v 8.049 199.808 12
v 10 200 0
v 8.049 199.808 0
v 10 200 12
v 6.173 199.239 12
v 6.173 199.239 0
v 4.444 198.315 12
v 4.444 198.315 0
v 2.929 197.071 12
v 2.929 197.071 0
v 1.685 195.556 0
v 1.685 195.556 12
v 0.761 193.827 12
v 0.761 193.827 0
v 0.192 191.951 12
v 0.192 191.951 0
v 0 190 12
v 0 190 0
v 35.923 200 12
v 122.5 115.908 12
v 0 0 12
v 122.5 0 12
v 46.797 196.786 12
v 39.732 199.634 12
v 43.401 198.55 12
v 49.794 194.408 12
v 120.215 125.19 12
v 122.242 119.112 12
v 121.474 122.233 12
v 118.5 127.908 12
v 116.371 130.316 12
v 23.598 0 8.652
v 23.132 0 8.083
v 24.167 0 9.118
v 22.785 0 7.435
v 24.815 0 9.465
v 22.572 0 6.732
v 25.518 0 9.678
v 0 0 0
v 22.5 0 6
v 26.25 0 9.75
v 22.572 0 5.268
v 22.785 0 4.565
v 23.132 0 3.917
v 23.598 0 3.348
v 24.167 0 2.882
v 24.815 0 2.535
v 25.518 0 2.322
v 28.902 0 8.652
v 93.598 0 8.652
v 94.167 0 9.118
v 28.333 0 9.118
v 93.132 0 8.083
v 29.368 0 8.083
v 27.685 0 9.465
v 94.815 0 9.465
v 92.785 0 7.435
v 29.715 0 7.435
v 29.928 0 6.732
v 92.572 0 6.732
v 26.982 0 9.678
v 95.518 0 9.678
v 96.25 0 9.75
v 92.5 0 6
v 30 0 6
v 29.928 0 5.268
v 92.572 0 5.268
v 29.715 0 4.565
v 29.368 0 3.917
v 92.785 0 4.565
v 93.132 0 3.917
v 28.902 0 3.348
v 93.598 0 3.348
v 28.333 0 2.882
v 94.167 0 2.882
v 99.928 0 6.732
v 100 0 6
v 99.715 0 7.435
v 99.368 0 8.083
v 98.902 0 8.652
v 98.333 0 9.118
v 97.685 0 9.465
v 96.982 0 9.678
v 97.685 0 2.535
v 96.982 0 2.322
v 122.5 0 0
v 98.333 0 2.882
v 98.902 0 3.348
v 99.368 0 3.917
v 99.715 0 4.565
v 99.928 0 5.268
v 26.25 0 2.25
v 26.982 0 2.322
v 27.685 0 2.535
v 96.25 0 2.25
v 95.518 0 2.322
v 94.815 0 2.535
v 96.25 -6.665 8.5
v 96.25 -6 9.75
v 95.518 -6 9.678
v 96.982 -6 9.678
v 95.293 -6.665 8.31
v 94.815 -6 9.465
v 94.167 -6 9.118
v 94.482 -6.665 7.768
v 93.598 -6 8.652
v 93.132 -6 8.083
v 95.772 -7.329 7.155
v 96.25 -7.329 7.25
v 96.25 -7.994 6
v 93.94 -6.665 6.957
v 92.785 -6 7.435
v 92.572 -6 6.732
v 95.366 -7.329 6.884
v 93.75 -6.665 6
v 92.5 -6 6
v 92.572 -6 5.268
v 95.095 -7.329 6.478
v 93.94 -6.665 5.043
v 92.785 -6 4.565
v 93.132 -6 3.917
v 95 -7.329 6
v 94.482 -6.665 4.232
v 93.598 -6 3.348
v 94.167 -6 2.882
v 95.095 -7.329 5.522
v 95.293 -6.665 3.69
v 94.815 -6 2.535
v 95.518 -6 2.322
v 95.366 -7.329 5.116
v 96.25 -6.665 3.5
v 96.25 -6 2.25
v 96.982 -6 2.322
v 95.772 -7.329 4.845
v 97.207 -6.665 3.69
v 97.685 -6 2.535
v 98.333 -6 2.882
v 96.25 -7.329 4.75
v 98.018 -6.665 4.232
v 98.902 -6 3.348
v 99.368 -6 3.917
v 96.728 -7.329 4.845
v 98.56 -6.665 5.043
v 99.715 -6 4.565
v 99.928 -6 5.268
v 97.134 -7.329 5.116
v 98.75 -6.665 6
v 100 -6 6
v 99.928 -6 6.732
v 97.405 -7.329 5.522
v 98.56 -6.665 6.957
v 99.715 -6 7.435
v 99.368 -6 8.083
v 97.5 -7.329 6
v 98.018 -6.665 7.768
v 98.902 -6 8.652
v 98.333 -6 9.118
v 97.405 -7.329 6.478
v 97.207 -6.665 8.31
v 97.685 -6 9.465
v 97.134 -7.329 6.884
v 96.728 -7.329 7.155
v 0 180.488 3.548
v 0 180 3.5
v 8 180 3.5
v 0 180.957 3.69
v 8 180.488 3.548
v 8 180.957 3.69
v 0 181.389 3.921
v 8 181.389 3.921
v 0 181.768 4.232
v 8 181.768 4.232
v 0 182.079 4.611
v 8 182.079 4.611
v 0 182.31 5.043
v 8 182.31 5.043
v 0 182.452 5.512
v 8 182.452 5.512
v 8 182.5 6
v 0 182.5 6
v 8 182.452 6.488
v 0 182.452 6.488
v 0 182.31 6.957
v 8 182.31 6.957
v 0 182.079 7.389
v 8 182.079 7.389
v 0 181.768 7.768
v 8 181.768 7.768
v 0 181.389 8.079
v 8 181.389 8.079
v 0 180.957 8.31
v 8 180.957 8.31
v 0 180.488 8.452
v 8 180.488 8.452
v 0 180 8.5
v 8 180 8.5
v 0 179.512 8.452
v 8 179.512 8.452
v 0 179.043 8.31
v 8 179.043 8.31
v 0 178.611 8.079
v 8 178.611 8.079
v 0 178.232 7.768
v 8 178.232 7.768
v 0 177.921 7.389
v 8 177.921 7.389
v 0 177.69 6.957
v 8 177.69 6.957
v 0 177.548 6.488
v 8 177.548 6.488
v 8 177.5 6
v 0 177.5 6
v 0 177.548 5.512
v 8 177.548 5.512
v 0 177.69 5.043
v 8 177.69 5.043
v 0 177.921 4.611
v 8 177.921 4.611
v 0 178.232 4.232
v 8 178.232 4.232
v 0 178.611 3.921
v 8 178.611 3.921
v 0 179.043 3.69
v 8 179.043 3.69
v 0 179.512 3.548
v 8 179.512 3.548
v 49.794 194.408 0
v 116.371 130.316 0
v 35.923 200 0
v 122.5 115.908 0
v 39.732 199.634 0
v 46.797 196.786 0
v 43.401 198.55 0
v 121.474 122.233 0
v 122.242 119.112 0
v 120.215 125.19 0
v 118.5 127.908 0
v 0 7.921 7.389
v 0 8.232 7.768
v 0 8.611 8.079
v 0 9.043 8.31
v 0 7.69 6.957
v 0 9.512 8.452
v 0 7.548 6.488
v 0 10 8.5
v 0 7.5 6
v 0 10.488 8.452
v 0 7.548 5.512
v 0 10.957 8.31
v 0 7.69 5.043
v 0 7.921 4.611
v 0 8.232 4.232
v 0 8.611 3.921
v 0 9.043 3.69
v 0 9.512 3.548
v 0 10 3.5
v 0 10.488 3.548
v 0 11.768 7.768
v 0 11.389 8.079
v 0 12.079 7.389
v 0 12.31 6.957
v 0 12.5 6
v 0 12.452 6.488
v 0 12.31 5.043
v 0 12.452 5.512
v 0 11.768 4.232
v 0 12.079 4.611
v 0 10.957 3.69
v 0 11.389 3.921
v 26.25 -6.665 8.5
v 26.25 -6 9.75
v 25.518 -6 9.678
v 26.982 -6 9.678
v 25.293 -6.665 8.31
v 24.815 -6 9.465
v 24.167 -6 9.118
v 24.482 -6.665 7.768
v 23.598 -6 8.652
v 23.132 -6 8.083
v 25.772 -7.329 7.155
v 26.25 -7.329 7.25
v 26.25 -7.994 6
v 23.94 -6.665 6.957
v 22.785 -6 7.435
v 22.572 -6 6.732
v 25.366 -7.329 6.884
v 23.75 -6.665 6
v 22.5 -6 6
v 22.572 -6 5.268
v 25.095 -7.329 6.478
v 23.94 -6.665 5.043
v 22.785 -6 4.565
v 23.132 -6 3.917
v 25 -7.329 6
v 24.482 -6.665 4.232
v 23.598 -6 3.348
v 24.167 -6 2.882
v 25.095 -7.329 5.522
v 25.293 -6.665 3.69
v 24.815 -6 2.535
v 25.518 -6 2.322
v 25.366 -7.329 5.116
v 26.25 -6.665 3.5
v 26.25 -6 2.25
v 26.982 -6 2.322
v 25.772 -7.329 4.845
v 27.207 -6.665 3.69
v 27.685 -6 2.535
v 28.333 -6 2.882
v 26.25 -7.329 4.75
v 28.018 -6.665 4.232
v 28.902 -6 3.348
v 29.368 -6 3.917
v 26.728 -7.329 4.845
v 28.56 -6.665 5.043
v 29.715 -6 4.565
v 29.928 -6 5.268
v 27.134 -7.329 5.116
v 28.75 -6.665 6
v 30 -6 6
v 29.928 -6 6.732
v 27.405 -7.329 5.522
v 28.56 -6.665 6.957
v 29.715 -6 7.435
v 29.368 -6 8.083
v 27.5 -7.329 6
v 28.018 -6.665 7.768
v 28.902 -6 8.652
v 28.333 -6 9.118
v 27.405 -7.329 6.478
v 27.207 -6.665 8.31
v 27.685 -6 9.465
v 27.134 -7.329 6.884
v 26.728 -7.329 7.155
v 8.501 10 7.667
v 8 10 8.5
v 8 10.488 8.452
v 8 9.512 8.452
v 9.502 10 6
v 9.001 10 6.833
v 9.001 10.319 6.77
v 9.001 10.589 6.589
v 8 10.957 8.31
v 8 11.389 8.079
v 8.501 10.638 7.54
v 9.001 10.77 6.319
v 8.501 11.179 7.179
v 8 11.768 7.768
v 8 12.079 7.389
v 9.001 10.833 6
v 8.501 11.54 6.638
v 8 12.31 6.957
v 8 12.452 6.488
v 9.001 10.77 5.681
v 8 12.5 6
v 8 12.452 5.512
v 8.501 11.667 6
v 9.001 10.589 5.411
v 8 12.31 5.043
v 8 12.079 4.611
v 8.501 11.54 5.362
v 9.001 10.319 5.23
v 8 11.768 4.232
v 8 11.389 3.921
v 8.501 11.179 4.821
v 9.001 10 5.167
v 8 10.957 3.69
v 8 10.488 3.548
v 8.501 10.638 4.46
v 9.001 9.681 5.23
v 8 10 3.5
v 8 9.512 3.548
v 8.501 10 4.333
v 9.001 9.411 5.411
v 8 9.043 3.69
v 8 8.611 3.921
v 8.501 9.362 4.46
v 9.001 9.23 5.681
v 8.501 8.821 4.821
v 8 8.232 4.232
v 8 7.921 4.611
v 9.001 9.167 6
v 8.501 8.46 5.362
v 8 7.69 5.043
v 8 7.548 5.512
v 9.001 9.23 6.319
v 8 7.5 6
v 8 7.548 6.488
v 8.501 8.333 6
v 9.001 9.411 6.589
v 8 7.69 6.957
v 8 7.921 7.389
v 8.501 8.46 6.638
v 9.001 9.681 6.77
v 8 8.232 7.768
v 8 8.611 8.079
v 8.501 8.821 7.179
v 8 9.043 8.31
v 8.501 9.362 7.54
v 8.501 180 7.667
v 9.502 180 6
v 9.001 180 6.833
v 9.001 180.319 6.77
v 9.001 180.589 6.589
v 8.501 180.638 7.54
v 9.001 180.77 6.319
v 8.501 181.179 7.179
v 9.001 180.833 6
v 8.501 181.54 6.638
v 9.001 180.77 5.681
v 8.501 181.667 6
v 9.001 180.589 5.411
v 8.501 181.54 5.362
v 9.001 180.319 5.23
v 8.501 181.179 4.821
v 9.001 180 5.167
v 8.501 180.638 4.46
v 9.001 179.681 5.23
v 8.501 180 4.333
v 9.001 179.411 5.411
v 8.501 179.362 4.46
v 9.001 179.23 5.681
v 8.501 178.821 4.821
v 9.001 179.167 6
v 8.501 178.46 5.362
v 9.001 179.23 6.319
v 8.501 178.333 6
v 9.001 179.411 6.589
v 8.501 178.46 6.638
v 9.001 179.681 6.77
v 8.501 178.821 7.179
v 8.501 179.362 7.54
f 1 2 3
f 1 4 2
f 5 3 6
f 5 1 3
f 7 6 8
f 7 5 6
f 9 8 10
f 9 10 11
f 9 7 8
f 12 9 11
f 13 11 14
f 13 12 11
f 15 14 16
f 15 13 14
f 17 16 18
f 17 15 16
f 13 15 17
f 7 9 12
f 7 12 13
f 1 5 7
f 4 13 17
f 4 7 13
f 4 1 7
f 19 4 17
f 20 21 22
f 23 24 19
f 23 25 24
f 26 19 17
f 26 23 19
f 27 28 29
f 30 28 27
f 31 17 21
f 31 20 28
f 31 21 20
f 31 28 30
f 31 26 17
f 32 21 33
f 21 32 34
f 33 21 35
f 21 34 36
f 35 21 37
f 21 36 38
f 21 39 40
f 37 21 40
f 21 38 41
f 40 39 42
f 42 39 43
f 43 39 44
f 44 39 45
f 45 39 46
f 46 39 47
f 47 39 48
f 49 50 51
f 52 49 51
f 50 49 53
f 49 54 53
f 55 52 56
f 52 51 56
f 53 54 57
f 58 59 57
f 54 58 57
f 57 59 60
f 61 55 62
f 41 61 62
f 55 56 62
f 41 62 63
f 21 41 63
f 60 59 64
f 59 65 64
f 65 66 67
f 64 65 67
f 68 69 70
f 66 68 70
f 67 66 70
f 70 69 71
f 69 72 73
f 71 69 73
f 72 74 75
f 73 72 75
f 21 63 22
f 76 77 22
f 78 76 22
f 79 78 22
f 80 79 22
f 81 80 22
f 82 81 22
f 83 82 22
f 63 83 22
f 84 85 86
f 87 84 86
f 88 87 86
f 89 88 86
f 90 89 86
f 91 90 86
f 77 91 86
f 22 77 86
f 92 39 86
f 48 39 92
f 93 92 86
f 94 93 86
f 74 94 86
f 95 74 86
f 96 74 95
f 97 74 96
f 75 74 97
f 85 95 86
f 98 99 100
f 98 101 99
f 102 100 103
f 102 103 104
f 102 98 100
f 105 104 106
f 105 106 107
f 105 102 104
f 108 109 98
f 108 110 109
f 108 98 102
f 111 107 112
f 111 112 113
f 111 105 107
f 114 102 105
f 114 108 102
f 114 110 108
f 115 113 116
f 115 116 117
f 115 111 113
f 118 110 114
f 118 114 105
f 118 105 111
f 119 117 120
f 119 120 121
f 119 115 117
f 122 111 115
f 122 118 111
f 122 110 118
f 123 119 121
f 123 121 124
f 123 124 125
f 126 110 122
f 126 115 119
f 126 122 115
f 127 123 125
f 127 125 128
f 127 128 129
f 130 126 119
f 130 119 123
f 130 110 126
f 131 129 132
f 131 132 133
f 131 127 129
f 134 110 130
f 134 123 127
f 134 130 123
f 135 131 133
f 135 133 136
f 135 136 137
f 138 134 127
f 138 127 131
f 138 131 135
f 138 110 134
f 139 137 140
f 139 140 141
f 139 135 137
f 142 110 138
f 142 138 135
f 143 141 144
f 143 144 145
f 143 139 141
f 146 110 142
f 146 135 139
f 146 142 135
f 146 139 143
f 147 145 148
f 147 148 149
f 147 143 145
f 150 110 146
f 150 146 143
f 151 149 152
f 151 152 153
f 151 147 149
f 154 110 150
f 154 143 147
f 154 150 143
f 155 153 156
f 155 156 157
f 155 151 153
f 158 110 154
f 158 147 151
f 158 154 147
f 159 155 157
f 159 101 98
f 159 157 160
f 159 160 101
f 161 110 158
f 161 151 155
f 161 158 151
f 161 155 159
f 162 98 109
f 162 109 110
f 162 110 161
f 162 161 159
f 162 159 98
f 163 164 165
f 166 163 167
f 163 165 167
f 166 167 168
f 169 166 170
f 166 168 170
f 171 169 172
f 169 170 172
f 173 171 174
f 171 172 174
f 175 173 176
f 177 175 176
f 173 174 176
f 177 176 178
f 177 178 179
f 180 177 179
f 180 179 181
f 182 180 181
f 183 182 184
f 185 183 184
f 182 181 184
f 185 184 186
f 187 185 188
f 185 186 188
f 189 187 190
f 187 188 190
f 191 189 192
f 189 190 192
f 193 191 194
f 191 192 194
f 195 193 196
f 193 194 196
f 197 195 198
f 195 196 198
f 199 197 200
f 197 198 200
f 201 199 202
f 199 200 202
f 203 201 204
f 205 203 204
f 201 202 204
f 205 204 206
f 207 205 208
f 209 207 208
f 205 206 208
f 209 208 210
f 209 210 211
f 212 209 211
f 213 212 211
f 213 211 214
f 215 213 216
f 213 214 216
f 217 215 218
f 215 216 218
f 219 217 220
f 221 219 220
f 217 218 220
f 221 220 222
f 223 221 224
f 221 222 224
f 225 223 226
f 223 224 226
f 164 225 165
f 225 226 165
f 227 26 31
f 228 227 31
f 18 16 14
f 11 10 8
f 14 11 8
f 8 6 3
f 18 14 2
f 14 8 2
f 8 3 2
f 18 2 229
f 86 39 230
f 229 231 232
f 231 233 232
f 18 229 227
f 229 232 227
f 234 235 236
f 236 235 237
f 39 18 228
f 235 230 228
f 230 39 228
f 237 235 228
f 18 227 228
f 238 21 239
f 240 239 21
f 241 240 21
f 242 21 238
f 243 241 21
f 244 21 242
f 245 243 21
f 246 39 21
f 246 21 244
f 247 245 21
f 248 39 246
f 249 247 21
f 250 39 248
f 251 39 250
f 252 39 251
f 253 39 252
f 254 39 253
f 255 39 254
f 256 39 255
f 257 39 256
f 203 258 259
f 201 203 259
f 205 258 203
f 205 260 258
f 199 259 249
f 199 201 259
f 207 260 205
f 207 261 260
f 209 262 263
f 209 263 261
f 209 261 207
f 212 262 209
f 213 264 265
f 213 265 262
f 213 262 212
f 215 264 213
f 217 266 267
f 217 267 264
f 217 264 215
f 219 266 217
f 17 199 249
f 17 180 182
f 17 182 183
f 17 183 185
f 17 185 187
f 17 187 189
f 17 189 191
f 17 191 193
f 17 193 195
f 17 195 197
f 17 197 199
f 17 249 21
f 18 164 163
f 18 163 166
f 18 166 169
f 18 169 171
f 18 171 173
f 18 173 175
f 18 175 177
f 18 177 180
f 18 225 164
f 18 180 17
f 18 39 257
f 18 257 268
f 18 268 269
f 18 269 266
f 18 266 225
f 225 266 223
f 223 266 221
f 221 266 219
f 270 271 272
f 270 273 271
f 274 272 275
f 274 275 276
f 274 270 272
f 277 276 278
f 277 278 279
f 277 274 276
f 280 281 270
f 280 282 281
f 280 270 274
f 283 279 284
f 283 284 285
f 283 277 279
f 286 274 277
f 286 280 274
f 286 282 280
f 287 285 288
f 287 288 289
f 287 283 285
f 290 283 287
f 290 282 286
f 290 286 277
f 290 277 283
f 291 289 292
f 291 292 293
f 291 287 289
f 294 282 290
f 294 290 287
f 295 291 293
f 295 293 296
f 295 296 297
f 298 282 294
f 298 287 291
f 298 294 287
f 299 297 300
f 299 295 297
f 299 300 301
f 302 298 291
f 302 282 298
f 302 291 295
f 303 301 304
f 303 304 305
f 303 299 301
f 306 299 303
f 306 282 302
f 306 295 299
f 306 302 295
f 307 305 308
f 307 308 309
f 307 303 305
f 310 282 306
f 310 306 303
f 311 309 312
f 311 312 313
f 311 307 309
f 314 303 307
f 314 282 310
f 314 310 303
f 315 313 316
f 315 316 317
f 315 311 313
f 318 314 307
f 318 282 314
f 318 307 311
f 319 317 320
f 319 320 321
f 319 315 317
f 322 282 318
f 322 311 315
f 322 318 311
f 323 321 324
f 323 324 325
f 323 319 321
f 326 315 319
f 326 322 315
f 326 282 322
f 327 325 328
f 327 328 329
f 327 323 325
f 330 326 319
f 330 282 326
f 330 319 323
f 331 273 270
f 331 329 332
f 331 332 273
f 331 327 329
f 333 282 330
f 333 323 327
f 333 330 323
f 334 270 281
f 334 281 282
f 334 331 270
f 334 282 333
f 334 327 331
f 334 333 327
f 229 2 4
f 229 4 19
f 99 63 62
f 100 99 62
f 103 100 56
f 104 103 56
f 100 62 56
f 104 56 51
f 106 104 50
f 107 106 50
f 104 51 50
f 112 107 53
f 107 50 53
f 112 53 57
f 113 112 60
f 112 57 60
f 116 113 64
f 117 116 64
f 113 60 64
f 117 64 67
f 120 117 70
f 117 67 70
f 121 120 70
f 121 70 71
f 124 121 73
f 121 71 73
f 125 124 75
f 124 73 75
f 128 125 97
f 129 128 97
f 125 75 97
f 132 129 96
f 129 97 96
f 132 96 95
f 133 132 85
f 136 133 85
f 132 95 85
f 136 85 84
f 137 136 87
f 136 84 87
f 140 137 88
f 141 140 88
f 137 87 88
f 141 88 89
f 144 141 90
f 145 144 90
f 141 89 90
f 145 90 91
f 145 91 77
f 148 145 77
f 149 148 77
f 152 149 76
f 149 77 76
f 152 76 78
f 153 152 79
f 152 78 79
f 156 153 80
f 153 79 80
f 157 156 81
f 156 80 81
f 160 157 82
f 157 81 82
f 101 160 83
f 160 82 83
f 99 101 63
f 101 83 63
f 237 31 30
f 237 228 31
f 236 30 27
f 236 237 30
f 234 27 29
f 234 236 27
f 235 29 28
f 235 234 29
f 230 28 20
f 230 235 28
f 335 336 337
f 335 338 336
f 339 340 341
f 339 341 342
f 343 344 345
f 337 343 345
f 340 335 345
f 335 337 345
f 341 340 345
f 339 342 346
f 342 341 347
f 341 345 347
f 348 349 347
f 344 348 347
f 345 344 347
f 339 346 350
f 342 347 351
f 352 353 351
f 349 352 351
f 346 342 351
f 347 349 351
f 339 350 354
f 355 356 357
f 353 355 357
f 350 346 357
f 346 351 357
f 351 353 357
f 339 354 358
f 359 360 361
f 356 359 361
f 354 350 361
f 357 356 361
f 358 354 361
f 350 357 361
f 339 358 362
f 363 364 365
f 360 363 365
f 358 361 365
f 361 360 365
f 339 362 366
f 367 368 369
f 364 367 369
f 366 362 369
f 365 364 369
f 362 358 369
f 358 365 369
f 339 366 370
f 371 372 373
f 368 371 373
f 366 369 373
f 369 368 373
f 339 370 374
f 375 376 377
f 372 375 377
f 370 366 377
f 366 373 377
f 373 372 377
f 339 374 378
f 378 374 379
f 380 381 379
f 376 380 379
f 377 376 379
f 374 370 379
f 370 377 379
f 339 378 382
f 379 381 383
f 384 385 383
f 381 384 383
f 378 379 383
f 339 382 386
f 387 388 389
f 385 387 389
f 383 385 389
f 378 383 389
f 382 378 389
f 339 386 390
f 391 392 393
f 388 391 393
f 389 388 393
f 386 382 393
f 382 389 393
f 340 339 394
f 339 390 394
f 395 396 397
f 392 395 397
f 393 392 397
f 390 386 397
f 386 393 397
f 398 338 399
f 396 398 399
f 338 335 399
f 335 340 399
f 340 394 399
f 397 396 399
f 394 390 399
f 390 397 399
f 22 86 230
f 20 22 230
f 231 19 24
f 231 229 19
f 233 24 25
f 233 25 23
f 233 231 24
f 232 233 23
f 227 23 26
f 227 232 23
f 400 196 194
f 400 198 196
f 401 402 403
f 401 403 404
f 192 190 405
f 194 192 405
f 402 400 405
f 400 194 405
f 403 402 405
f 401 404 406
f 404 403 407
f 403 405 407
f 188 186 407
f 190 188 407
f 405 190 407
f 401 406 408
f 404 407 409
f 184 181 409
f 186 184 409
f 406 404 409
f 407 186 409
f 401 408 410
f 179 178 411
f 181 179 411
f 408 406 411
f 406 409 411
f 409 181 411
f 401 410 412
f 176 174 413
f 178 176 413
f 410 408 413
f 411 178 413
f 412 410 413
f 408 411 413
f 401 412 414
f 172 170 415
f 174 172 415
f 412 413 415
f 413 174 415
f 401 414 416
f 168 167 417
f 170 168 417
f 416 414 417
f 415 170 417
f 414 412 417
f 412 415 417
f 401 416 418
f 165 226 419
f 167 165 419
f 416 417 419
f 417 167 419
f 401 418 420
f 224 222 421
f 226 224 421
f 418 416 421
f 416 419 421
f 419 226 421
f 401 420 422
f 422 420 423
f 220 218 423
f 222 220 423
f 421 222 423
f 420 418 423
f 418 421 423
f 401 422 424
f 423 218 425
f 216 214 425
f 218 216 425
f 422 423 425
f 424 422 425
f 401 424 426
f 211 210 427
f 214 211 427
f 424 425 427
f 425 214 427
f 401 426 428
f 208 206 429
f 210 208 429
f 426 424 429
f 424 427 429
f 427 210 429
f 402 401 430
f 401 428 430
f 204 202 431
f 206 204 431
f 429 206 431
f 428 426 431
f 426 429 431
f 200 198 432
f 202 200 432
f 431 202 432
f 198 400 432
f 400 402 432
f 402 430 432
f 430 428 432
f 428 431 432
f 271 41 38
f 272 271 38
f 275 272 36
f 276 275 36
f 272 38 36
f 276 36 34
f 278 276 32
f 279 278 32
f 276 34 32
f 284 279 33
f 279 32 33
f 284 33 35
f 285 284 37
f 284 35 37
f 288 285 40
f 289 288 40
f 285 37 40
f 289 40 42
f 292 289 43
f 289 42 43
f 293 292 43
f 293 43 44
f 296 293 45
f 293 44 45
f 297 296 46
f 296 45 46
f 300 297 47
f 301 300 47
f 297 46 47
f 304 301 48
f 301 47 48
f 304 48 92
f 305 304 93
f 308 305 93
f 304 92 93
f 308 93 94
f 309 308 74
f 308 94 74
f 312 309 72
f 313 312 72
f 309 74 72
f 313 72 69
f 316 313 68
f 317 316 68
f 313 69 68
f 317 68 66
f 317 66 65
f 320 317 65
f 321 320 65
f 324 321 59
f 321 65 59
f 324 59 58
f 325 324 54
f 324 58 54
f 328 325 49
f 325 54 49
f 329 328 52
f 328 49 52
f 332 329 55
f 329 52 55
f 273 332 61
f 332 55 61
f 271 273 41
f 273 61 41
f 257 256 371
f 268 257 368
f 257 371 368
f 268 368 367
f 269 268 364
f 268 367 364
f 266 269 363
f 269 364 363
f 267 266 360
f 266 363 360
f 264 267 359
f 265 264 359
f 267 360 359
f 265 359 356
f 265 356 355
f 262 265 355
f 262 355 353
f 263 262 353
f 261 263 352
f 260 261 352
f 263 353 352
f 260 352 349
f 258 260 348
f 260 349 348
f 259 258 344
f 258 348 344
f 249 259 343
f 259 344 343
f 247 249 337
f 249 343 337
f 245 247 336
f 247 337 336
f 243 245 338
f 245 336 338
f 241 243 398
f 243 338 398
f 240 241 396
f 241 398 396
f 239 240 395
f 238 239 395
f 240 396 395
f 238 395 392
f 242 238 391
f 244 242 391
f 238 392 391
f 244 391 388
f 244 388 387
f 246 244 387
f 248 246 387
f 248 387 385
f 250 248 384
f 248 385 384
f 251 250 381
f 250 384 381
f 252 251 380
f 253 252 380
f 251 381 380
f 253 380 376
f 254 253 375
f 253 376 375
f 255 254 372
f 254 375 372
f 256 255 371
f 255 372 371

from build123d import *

# Parameters (mm, degrees)
SKETCH4_W                    = 122.5
SKETCH4_H                    = 200
BOSS_EXTRUDE1_DEPTH          = 12
CUT_EXTRUDE1_DEPTH           = 12
FILLET1_R                    = 20
FILLET2_R                    = 20
FILLET3_R                    = 10
SKETCH10_R                   = 3.75
BOSS_EXTRUDE3_DEPTH          = 6
F_5_0_5_DIAMETER_HOLE1_D     = 5
F_5_0_5_DIAMETER_HOLE1_DEPTH = 8
F_5_0_5_DIAMETER_HOLE1_TIP   = 1.502151548
F_5_0_5_DIAMETER_HOLE2_D     = 5
F_5_0_5_DIAMETER_HOLE2_DEPTH = 8
F_5_0_5_DIAMETER_HOLE2_TIP   = 1.502151548


with BuildPart() as part:
    # Sketch4 → Boss-Extrude1 (new body)
    with BuildSketch(Plane.XY):
        with Locations((61.25, 100)):
            Rectangle(SKETCH4_W, SKETCH4_H)
    extrude(amount=BOSS_EXTRUDE1_DEPTH)

    # Sketch7 → Cut-Extrude1 (cut)
    with BuildSketch(Plane.XY.offset(12)):
        Polygon((43.985796602, 200), (122.5, 124.415794753), (122.5, 200), align=None)
    extrude(amount=-CUT_EXTRUDE1_DEPTH, mode=Mode.SUBTRACT)

    # Fillet1
    fillet1_edges = [part.edges().sort_by_distance(p)[0] for p in [
        (43.985796602, 200, 6),
    ]]
    fillet(fillet1_edges, radius=FILLET1_R)

    # Fillet2
    fillet2_edges = [part.edges().sort_by_distance(p)[0] for p in [
        (122.5, 124.415794753, 6),
    ]]
    fillet(fillet2_edges, radius=FILLET2_R)

    # Fillet3
    fillet3_edges = [part.edges().sort_by_distance(p)[0] for p in [
        (0, 200, 6),
    ]]
    fillet(fillet3_edges, radius=FILLET3_R)

    # Sketch10 → Boss-Extrude3 (add)
    with BuildSketch(Plane.XZ):
        with Locations(Location((26.25, 6, 0), (0, 0, 90))):
            Circle(SKETCH10_R)
        with Locations(Location((96.25, 6, 0), (0, 0, 90))):
            Circle(SKETCH10_R)
    extrude(amount=BOSS_EXTRUDE3_DEPTH)

    # Boss-Extrude4 cone 1 section (through the dimple's axis) → Boss-Extrude4 (revolve)
    with BuildSketch(Plane(origin=(26.25, -6, 6), x_dir=(0, 0, 1), z_dir=(1, 0, 0))):
        Polygon((0, 0), (3.75, 0), (0, 1.993910369), align=None)
    revolve(axis=Axis((26.25, -6, 6), (0, -1, 0)))

    # Boss-Extrude4 cone 2 section (through the dimple's axis) → Boss-Extrude4 cone 2 (revolve)
    with BuildSketch(Plane(origin=(96.25, -6, 6), x_dir=(0, 0, 1), z_dir=(1, 0, 0))):
        Polygon((0, 0), (3.75, 0), (0, 1.993910369), align=None)
    revolve(axis=Axis((96.25, -6, 6), (0, -1, 0)))

    # Ø5.0 (5) Diameter Hole1
    with Locations(Plane.ZY):
        with Locations((6, 180)):
            Hole(F_5_0_5_DIAMETER_HOLE1_D / 2, depth=F_5_0_5_DIAMETER_HOLE1_DEPTH)
            with Locations((0, 0, -(F_5_0_5_DIAMETER_HOLE1_DEPTH + F_5_0_5_DIAMETER_HOLE1_TIP / 2))):  # 118° drill point
                Cone(0, F_5_0_5_DIAMETER_HOLE1_D / 2, F_5_0_5_DIAMETER_HOLE1_TIP, mode=Mode.SUBTRACT)

    # Ø5.0 (5) Diameter Hole2
    with Locations(Plane.ZY):
        with Locations((6, 10)):
            Hole(F_5_0_5_DIAMETER_HOLE2_D / 2, depth=F_5_0_5_DIAMETER_HOLE2_DEPTH)
            with Locations((0, 0, -(F_5_0_5_DIAMETER_HOLE2_DEPTH + F_5_0_5_DIAMETER_HOLE2_TIP / 2))):  # 118° drill point
                Cone(0, F_5_0_5_DIAMETER_HOLE2_D / 2, F_5_0_5_DIAMETER_HOLE2_TIP, mode=Mode.SUBTRACT)


solid = part.part
